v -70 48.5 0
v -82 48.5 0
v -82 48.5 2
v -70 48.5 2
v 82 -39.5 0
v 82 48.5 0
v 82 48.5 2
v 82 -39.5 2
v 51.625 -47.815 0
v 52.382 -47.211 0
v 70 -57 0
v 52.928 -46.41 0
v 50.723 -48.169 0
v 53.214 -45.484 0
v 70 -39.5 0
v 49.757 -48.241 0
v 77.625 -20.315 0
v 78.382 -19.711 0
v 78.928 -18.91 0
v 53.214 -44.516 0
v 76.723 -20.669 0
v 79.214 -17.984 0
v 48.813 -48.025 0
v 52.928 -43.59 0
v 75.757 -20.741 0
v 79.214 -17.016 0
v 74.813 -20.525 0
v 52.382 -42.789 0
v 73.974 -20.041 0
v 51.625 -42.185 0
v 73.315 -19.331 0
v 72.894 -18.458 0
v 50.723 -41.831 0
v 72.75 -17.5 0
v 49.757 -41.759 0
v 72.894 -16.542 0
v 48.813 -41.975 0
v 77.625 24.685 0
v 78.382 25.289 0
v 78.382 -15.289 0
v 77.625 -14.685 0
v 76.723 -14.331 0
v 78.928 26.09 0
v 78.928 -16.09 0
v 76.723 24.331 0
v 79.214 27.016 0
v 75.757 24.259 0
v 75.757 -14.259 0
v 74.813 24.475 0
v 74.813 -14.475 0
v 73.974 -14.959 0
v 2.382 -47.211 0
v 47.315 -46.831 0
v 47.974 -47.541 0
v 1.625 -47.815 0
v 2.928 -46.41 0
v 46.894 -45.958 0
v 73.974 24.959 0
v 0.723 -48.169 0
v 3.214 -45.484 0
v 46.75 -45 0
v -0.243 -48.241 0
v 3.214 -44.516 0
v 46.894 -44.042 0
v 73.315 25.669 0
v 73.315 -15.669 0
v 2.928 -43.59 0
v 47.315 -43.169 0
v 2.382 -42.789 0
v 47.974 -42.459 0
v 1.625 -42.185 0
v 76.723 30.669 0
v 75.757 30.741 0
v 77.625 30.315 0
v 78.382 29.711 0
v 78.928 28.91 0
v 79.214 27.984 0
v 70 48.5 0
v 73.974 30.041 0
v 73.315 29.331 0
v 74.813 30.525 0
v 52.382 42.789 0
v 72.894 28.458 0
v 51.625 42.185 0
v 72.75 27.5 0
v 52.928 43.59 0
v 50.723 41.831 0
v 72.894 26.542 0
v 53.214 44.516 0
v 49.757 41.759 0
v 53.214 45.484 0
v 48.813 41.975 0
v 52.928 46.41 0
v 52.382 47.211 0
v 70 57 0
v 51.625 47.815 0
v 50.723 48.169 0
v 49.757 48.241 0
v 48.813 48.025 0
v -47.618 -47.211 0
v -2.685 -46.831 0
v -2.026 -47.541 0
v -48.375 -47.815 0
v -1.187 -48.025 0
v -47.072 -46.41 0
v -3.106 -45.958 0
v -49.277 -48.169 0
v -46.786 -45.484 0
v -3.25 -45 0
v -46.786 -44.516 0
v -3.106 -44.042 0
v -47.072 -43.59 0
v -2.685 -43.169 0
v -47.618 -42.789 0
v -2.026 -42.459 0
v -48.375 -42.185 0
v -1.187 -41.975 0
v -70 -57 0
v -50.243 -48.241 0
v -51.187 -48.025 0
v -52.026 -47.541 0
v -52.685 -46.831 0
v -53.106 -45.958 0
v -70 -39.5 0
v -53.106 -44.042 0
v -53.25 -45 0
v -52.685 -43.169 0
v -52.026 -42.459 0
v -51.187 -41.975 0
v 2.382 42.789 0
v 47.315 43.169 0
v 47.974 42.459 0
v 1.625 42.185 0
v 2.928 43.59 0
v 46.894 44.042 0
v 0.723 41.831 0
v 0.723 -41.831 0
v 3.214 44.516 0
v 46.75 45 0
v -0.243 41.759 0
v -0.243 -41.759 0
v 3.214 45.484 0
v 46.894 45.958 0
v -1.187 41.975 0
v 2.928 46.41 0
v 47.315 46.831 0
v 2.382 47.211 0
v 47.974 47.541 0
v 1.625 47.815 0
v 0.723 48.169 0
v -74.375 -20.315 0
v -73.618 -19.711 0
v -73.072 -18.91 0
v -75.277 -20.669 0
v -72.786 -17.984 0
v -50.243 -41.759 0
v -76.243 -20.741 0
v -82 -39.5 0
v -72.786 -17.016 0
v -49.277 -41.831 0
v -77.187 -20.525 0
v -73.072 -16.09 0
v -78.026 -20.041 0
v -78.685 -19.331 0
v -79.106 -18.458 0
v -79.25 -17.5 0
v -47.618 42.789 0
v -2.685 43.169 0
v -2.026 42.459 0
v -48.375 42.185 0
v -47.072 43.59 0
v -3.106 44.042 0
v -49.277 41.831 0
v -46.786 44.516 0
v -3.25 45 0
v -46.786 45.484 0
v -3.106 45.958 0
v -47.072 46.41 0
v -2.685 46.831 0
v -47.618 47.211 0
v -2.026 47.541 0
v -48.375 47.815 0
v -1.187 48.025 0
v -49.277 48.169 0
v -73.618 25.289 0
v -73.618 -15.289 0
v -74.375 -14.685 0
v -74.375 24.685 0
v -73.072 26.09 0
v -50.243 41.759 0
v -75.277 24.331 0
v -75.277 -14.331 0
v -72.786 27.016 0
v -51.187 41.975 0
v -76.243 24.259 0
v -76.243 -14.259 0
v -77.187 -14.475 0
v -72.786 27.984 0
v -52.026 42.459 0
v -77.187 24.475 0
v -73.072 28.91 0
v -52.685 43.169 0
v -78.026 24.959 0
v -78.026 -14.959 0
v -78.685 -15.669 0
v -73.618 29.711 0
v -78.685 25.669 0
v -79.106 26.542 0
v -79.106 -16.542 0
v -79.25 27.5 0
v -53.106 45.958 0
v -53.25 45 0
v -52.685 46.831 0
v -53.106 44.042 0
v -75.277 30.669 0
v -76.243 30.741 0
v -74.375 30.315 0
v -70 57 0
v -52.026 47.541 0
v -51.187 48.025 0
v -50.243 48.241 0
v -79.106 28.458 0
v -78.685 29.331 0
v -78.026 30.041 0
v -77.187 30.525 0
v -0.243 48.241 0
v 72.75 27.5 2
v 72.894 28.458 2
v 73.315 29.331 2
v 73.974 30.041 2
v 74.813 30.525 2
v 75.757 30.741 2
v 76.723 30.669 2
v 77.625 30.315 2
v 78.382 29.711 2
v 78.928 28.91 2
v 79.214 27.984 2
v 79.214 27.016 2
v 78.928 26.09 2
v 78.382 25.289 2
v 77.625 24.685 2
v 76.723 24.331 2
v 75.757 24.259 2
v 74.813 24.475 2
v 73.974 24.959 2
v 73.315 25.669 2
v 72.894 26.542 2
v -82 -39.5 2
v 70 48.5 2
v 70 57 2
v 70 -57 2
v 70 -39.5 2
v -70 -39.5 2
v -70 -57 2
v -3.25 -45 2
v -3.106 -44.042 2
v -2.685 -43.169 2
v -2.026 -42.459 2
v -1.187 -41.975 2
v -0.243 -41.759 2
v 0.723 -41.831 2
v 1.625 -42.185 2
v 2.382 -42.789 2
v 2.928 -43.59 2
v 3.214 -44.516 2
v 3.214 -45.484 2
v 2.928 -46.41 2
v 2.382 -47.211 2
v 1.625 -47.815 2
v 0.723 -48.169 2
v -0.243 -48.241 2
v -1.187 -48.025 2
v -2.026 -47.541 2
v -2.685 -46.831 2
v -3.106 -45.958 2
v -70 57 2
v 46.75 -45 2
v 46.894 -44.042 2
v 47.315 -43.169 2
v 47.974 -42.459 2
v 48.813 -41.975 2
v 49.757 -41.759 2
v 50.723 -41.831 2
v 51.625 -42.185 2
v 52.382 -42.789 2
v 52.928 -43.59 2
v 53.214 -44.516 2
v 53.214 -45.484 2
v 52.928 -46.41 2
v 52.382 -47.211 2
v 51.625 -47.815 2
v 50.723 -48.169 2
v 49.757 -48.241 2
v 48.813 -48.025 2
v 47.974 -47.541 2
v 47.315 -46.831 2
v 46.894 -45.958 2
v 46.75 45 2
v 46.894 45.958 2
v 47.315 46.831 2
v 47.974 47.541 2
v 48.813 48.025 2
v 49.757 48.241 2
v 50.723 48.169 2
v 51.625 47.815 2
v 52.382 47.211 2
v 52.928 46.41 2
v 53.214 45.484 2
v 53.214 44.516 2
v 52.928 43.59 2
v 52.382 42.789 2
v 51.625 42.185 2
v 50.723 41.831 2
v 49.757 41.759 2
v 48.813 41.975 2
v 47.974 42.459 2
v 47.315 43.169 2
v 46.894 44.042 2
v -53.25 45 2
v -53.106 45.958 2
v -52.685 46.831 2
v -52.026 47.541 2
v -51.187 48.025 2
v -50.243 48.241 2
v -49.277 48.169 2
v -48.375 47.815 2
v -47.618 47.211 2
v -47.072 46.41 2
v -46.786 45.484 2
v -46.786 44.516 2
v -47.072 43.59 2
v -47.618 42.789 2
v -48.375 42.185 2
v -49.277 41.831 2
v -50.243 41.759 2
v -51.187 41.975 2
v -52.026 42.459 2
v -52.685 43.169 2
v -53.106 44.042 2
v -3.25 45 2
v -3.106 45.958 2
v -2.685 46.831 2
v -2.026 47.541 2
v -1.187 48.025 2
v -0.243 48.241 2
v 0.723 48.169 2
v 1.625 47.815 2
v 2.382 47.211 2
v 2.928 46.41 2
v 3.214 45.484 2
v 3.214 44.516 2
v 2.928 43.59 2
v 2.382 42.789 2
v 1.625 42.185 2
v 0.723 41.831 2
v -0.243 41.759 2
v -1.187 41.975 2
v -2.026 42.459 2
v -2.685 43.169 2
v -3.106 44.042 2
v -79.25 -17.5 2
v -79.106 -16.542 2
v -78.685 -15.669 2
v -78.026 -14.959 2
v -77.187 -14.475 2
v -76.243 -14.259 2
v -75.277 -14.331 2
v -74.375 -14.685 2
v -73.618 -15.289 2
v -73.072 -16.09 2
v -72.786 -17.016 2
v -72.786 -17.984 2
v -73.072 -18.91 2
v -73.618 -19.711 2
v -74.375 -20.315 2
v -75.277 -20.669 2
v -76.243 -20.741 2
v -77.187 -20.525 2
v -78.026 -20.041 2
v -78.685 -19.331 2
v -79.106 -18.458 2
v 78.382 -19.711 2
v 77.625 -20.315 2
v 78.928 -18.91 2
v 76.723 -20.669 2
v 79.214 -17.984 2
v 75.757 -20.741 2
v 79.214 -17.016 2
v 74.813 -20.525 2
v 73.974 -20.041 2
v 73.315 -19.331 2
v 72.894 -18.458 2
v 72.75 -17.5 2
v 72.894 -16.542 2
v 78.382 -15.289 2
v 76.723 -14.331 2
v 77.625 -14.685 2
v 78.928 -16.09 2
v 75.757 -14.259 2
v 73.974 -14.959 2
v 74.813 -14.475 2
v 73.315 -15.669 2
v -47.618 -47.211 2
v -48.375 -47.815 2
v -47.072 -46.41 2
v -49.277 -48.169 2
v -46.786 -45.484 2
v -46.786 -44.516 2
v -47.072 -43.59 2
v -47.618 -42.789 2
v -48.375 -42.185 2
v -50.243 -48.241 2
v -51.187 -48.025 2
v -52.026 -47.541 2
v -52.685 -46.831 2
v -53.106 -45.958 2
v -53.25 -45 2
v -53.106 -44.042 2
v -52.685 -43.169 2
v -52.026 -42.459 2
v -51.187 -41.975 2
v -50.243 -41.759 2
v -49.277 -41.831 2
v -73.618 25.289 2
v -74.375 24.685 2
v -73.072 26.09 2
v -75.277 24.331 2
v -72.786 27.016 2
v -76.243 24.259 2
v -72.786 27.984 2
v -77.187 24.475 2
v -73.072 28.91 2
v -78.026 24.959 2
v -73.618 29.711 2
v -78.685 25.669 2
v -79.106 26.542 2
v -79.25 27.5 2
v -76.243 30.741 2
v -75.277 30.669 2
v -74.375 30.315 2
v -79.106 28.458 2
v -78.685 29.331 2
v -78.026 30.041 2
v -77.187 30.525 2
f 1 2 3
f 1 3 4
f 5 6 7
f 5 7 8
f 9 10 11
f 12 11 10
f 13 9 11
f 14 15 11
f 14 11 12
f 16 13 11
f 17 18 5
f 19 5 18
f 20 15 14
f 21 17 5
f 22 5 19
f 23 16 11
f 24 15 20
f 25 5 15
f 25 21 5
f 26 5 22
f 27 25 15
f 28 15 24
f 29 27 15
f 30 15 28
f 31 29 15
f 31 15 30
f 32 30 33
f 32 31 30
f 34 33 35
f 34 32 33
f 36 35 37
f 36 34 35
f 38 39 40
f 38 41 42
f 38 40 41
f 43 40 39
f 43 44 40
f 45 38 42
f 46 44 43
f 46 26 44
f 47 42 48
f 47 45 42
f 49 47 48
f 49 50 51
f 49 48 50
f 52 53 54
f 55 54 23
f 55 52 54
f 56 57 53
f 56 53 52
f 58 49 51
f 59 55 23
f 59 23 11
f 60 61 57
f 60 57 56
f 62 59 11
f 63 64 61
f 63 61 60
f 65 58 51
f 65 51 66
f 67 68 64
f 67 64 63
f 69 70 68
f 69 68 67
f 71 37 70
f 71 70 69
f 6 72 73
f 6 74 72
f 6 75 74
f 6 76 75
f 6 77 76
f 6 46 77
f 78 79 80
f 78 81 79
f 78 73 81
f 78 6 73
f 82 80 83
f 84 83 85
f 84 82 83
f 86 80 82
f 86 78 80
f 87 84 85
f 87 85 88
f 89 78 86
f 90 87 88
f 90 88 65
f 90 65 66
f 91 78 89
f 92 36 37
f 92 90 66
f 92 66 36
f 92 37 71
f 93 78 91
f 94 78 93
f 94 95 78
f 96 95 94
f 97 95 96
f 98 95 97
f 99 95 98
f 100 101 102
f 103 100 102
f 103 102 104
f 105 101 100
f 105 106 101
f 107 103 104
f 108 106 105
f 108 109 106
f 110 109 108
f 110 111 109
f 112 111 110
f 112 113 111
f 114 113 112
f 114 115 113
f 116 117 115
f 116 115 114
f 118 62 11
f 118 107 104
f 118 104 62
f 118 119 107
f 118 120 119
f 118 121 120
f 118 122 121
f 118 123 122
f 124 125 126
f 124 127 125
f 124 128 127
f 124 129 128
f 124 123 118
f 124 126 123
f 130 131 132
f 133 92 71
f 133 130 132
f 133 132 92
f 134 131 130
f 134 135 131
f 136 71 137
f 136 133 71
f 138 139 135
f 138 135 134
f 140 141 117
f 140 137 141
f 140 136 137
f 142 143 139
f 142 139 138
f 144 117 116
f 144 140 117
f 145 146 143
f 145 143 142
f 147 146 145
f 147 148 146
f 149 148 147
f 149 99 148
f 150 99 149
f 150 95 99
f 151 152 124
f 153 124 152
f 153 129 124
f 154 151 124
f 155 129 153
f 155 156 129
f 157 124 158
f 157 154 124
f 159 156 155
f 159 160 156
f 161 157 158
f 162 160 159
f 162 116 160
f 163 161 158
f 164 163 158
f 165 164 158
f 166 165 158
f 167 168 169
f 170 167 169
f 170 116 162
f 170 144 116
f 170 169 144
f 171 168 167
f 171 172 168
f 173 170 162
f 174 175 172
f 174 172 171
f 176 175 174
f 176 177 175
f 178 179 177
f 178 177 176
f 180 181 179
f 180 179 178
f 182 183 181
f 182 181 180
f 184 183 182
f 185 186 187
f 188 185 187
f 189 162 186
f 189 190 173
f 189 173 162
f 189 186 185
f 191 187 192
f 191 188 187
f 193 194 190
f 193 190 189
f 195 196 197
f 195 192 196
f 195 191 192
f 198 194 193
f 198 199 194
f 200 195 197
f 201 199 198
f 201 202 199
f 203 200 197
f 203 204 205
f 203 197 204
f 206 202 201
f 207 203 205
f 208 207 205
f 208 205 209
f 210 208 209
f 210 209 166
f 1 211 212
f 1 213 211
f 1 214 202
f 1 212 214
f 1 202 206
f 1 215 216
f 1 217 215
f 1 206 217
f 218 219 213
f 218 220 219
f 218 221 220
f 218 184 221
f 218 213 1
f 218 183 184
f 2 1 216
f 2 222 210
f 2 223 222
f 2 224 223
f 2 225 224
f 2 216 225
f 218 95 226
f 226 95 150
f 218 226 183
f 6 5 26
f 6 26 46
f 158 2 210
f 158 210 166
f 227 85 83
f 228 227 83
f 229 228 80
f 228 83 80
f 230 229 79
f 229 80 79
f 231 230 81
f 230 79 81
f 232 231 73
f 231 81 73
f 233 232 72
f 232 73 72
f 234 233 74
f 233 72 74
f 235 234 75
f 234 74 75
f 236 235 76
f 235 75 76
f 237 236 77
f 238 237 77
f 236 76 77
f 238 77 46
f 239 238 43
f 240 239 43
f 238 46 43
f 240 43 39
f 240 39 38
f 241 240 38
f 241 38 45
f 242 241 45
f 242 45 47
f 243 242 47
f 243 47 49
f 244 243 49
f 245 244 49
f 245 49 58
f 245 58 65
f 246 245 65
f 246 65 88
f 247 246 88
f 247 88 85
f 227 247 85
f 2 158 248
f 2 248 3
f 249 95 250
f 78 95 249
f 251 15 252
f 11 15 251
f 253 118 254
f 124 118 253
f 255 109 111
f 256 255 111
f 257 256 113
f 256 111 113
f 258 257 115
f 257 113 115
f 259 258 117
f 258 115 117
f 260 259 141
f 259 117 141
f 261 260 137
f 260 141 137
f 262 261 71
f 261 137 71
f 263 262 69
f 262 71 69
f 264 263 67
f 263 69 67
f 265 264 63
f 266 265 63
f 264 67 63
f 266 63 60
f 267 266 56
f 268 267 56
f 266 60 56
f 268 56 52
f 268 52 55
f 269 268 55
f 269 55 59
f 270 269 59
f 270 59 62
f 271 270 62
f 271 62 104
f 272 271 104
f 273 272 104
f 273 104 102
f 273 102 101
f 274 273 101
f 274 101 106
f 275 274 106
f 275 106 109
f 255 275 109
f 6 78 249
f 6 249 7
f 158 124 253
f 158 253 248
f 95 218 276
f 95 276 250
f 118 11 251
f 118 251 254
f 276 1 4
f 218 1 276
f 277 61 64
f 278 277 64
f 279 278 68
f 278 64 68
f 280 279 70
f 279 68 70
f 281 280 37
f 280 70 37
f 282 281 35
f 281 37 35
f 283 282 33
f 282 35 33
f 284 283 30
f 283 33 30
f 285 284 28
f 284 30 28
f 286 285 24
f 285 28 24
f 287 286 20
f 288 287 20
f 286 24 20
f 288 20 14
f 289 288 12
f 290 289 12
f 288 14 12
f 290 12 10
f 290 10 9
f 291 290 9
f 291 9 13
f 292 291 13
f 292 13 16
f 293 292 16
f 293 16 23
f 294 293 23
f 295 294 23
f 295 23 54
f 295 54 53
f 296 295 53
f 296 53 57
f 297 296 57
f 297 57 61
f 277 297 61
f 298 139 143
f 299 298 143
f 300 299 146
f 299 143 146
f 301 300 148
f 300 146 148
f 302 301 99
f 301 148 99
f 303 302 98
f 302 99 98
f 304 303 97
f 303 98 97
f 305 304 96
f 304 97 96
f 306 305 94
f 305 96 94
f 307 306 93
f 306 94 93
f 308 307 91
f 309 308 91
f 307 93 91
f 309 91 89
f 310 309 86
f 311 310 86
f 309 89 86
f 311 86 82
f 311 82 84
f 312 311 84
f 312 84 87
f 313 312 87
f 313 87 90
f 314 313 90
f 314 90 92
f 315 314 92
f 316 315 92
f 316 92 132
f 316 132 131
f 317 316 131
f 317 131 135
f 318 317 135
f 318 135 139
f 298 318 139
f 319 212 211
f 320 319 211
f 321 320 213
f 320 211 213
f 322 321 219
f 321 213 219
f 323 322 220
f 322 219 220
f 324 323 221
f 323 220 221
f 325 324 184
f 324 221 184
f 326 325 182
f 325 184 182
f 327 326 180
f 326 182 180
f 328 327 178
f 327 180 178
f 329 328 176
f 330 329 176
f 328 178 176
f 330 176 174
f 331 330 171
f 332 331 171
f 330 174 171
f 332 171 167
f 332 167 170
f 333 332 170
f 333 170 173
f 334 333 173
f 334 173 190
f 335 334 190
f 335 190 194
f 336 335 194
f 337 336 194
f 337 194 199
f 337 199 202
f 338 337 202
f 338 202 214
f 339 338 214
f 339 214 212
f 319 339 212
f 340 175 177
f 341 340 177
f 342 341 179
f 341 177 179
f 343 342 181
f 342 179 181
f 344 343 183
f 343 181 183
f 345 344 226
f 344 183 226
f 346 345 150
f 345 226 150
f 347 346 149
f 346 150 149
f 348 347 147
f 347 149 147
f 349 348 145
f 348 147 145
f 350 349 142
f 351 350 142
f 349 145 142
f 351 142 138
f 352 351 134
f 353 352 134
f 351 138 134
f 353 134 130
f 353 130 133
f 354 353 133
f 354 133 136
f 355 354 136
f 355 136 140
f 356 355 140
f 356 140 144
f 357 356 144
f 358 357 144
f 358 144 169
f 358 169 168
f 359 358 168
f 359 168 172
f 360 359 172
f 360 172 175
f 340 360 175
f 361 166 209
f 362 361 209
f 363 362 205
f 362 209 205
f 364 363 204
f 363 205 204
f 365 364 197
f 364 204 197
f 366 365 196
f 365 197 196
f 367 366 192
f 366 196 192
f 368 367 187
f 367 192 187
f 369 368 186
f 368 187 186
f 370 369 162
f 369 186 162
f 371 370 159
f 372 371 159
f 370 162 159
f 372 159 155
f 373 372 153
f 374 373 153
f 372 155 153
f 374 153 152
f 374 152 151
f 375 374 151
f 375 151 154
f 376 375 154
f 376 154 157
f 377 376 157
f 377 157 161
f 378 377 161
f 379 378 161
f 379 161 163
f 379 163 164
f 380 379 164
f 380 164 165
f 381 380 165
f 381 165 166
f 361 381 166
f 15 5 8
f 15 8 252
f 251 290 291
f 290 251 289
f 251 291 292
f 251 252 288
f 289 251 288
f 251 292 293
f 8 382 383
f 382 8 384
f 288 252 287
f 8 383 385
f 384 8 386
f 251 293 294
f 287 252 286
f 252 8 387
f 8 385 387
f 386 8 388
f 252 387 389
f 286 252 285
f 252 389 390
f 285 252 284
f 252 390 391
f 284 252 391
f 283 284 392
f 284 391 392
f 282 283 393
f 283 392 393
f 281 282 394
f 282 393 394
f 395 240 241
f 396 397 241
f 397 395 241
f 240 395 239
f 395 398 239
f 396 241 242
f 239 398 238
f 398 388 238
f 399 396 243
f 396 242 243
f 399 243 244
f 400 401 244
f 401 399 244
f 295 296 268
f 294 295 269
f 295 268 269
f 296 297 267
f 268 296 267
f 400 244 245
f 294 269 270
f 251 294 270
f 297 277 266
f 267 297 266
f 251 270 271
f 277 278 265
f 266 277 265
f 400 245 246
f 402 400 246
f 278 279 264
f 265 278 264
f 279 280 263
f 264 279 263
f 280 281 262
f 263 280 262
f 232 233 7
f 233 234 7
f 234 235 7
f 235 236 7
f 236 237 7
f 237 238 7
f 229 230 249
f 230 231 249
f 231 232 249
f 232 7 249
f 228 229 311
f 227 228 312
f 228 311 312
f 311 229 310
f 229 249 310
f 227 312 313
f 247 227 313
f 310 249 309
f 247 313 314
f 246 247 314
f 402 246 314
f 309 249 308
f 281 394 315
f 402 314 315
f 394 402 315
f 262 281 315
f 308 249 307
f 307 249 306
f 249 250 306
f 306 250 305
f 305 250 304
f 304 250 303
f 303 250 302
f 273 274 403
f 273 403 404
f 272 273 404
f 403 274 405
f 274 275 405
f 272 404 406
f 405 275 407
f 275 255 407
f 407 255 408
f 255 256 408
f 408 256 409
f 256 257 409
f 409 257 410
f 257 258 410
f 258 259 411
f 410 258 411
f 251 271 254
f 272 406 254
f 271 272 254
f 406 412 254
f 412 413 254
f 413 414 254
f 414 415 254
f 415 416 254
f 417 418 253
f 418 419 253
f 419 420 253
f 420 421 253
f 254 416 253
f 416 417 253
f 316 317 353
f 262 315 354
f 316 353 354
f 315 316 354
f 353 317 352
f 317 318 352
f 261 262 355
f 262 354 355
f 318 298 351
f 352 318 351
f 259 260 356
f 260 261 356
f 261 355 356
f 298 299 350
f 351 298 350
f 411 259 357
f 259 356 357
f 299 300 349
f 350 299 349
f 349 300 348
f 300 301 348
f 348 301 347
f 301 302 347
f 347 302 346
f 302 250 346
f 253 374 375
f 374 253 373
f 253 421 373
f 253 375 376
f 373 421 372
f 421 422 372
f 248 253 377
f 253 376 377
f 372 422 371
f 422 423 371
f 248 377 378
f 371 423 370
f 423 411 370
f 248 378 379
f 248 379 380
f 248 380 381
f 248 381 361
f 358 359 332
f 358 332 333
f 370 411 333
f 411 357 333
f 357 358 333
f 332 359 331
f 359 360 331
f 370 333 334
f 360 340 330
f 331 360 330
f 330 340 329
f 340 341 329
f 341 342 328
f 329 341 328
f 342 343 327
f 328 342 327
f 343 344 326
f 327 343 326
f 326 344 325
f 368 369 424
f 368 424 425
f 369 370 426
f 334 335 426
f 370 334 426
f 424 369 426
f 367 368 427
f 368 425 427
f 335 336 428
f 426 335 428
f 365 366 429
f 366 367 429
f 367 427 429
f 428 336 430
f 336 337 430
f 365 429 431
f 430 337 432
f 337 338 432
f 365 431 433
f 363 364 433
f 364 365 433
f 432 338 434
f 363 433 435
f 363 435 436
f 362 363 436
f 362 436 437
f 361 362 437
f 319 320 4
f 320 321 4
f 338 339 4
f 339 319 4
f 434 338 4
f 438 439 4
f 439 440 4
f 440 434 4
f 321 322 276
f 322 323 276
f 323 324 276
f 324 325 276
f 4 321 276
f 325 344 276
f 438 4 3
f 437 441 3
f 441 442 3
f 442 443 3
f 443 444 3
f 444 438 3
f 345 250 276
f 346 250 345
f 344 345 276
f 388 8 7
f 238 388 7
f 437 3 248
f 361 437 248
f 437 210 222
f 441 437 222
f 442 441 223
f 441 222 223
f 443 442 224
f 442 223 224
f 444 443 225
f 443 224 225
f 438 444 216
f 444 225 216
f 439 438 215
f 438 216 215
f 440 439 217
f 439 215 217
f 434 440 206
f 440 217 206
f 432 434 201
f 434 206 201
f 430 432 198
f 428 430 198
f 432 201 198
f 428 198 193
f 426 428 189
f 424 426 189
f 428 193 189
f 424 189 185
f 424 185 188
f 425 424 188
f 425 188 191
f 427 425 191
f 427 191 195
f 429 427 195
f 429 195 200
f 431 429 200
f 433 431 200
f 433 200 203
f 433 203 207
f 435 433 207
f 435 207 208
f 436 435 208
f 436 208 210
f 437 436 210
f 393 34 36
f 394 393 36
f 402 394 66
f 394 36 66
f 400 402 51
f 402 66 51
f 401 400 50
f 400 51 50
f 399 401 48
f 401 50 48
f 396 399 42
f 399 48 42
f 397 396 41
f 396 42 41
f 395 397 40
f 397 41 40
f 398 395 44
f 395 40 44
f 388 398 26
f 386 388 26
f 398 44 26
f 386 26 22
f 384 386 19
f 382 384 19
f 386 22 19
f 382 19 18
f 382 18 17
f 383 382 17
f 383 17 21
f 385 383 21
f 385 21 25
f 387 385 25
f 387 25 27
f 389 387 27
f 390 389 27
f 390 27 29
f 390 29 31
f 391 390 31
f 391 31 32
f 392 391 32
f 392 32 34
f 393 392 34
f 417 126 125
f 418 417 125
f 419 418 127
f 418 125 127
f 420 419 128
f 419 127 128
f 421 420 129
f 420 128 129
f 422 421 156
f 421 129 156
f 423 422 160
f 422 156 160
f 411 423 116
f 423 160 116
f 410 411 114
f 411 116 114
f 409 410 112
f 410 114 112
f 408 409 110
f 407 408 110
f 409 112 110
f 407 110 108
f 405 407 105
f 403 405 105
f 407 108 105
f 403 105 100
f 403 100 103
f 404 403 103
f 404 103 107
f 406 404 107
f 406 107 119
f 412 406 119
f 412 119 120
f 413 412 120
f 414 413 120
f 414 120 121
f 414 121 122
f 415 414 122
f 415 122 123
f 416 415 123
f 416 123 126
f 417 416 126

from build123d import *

# Parameters (mm, degrees)
EXTRUDE_1_DEPTH   = 2
HOLE_WIZARD_M61_D = 6.5


with BuildPart() as part:
    # Эскиз1 → Вытянуть1 (new body)
    with BuildSketch(Plane.XY):
        Polygon((-70, 48.5), (-70, 57), (70, 57), (70, 48.5), (82, 48.5), (82, -39.5), (70, -39.5), (70, -57), (-70, -57), (-70, -39.5), (-82, -39.5), (-82, 48.5), align=None)
    extrude(amount=EXTRUDE_1_DEPTH)

    # Отверстие с зазором M61 (through all)
    with Locations(Plane(origin=(-76, 27.5, 2), x_dir=(1, 0, 0), z_dir=(0, 0, 1))):
        with Locations((0, 0), (0, -45), (26, -72.5), (76, -72.5), (126, -72.5), (126, 17.5), (76, 17.5), (26, 17.5), (152, 0), (152, -45)):
            Hole(HOLE_WIZARD_M61_D / 2)


solid = part.part
